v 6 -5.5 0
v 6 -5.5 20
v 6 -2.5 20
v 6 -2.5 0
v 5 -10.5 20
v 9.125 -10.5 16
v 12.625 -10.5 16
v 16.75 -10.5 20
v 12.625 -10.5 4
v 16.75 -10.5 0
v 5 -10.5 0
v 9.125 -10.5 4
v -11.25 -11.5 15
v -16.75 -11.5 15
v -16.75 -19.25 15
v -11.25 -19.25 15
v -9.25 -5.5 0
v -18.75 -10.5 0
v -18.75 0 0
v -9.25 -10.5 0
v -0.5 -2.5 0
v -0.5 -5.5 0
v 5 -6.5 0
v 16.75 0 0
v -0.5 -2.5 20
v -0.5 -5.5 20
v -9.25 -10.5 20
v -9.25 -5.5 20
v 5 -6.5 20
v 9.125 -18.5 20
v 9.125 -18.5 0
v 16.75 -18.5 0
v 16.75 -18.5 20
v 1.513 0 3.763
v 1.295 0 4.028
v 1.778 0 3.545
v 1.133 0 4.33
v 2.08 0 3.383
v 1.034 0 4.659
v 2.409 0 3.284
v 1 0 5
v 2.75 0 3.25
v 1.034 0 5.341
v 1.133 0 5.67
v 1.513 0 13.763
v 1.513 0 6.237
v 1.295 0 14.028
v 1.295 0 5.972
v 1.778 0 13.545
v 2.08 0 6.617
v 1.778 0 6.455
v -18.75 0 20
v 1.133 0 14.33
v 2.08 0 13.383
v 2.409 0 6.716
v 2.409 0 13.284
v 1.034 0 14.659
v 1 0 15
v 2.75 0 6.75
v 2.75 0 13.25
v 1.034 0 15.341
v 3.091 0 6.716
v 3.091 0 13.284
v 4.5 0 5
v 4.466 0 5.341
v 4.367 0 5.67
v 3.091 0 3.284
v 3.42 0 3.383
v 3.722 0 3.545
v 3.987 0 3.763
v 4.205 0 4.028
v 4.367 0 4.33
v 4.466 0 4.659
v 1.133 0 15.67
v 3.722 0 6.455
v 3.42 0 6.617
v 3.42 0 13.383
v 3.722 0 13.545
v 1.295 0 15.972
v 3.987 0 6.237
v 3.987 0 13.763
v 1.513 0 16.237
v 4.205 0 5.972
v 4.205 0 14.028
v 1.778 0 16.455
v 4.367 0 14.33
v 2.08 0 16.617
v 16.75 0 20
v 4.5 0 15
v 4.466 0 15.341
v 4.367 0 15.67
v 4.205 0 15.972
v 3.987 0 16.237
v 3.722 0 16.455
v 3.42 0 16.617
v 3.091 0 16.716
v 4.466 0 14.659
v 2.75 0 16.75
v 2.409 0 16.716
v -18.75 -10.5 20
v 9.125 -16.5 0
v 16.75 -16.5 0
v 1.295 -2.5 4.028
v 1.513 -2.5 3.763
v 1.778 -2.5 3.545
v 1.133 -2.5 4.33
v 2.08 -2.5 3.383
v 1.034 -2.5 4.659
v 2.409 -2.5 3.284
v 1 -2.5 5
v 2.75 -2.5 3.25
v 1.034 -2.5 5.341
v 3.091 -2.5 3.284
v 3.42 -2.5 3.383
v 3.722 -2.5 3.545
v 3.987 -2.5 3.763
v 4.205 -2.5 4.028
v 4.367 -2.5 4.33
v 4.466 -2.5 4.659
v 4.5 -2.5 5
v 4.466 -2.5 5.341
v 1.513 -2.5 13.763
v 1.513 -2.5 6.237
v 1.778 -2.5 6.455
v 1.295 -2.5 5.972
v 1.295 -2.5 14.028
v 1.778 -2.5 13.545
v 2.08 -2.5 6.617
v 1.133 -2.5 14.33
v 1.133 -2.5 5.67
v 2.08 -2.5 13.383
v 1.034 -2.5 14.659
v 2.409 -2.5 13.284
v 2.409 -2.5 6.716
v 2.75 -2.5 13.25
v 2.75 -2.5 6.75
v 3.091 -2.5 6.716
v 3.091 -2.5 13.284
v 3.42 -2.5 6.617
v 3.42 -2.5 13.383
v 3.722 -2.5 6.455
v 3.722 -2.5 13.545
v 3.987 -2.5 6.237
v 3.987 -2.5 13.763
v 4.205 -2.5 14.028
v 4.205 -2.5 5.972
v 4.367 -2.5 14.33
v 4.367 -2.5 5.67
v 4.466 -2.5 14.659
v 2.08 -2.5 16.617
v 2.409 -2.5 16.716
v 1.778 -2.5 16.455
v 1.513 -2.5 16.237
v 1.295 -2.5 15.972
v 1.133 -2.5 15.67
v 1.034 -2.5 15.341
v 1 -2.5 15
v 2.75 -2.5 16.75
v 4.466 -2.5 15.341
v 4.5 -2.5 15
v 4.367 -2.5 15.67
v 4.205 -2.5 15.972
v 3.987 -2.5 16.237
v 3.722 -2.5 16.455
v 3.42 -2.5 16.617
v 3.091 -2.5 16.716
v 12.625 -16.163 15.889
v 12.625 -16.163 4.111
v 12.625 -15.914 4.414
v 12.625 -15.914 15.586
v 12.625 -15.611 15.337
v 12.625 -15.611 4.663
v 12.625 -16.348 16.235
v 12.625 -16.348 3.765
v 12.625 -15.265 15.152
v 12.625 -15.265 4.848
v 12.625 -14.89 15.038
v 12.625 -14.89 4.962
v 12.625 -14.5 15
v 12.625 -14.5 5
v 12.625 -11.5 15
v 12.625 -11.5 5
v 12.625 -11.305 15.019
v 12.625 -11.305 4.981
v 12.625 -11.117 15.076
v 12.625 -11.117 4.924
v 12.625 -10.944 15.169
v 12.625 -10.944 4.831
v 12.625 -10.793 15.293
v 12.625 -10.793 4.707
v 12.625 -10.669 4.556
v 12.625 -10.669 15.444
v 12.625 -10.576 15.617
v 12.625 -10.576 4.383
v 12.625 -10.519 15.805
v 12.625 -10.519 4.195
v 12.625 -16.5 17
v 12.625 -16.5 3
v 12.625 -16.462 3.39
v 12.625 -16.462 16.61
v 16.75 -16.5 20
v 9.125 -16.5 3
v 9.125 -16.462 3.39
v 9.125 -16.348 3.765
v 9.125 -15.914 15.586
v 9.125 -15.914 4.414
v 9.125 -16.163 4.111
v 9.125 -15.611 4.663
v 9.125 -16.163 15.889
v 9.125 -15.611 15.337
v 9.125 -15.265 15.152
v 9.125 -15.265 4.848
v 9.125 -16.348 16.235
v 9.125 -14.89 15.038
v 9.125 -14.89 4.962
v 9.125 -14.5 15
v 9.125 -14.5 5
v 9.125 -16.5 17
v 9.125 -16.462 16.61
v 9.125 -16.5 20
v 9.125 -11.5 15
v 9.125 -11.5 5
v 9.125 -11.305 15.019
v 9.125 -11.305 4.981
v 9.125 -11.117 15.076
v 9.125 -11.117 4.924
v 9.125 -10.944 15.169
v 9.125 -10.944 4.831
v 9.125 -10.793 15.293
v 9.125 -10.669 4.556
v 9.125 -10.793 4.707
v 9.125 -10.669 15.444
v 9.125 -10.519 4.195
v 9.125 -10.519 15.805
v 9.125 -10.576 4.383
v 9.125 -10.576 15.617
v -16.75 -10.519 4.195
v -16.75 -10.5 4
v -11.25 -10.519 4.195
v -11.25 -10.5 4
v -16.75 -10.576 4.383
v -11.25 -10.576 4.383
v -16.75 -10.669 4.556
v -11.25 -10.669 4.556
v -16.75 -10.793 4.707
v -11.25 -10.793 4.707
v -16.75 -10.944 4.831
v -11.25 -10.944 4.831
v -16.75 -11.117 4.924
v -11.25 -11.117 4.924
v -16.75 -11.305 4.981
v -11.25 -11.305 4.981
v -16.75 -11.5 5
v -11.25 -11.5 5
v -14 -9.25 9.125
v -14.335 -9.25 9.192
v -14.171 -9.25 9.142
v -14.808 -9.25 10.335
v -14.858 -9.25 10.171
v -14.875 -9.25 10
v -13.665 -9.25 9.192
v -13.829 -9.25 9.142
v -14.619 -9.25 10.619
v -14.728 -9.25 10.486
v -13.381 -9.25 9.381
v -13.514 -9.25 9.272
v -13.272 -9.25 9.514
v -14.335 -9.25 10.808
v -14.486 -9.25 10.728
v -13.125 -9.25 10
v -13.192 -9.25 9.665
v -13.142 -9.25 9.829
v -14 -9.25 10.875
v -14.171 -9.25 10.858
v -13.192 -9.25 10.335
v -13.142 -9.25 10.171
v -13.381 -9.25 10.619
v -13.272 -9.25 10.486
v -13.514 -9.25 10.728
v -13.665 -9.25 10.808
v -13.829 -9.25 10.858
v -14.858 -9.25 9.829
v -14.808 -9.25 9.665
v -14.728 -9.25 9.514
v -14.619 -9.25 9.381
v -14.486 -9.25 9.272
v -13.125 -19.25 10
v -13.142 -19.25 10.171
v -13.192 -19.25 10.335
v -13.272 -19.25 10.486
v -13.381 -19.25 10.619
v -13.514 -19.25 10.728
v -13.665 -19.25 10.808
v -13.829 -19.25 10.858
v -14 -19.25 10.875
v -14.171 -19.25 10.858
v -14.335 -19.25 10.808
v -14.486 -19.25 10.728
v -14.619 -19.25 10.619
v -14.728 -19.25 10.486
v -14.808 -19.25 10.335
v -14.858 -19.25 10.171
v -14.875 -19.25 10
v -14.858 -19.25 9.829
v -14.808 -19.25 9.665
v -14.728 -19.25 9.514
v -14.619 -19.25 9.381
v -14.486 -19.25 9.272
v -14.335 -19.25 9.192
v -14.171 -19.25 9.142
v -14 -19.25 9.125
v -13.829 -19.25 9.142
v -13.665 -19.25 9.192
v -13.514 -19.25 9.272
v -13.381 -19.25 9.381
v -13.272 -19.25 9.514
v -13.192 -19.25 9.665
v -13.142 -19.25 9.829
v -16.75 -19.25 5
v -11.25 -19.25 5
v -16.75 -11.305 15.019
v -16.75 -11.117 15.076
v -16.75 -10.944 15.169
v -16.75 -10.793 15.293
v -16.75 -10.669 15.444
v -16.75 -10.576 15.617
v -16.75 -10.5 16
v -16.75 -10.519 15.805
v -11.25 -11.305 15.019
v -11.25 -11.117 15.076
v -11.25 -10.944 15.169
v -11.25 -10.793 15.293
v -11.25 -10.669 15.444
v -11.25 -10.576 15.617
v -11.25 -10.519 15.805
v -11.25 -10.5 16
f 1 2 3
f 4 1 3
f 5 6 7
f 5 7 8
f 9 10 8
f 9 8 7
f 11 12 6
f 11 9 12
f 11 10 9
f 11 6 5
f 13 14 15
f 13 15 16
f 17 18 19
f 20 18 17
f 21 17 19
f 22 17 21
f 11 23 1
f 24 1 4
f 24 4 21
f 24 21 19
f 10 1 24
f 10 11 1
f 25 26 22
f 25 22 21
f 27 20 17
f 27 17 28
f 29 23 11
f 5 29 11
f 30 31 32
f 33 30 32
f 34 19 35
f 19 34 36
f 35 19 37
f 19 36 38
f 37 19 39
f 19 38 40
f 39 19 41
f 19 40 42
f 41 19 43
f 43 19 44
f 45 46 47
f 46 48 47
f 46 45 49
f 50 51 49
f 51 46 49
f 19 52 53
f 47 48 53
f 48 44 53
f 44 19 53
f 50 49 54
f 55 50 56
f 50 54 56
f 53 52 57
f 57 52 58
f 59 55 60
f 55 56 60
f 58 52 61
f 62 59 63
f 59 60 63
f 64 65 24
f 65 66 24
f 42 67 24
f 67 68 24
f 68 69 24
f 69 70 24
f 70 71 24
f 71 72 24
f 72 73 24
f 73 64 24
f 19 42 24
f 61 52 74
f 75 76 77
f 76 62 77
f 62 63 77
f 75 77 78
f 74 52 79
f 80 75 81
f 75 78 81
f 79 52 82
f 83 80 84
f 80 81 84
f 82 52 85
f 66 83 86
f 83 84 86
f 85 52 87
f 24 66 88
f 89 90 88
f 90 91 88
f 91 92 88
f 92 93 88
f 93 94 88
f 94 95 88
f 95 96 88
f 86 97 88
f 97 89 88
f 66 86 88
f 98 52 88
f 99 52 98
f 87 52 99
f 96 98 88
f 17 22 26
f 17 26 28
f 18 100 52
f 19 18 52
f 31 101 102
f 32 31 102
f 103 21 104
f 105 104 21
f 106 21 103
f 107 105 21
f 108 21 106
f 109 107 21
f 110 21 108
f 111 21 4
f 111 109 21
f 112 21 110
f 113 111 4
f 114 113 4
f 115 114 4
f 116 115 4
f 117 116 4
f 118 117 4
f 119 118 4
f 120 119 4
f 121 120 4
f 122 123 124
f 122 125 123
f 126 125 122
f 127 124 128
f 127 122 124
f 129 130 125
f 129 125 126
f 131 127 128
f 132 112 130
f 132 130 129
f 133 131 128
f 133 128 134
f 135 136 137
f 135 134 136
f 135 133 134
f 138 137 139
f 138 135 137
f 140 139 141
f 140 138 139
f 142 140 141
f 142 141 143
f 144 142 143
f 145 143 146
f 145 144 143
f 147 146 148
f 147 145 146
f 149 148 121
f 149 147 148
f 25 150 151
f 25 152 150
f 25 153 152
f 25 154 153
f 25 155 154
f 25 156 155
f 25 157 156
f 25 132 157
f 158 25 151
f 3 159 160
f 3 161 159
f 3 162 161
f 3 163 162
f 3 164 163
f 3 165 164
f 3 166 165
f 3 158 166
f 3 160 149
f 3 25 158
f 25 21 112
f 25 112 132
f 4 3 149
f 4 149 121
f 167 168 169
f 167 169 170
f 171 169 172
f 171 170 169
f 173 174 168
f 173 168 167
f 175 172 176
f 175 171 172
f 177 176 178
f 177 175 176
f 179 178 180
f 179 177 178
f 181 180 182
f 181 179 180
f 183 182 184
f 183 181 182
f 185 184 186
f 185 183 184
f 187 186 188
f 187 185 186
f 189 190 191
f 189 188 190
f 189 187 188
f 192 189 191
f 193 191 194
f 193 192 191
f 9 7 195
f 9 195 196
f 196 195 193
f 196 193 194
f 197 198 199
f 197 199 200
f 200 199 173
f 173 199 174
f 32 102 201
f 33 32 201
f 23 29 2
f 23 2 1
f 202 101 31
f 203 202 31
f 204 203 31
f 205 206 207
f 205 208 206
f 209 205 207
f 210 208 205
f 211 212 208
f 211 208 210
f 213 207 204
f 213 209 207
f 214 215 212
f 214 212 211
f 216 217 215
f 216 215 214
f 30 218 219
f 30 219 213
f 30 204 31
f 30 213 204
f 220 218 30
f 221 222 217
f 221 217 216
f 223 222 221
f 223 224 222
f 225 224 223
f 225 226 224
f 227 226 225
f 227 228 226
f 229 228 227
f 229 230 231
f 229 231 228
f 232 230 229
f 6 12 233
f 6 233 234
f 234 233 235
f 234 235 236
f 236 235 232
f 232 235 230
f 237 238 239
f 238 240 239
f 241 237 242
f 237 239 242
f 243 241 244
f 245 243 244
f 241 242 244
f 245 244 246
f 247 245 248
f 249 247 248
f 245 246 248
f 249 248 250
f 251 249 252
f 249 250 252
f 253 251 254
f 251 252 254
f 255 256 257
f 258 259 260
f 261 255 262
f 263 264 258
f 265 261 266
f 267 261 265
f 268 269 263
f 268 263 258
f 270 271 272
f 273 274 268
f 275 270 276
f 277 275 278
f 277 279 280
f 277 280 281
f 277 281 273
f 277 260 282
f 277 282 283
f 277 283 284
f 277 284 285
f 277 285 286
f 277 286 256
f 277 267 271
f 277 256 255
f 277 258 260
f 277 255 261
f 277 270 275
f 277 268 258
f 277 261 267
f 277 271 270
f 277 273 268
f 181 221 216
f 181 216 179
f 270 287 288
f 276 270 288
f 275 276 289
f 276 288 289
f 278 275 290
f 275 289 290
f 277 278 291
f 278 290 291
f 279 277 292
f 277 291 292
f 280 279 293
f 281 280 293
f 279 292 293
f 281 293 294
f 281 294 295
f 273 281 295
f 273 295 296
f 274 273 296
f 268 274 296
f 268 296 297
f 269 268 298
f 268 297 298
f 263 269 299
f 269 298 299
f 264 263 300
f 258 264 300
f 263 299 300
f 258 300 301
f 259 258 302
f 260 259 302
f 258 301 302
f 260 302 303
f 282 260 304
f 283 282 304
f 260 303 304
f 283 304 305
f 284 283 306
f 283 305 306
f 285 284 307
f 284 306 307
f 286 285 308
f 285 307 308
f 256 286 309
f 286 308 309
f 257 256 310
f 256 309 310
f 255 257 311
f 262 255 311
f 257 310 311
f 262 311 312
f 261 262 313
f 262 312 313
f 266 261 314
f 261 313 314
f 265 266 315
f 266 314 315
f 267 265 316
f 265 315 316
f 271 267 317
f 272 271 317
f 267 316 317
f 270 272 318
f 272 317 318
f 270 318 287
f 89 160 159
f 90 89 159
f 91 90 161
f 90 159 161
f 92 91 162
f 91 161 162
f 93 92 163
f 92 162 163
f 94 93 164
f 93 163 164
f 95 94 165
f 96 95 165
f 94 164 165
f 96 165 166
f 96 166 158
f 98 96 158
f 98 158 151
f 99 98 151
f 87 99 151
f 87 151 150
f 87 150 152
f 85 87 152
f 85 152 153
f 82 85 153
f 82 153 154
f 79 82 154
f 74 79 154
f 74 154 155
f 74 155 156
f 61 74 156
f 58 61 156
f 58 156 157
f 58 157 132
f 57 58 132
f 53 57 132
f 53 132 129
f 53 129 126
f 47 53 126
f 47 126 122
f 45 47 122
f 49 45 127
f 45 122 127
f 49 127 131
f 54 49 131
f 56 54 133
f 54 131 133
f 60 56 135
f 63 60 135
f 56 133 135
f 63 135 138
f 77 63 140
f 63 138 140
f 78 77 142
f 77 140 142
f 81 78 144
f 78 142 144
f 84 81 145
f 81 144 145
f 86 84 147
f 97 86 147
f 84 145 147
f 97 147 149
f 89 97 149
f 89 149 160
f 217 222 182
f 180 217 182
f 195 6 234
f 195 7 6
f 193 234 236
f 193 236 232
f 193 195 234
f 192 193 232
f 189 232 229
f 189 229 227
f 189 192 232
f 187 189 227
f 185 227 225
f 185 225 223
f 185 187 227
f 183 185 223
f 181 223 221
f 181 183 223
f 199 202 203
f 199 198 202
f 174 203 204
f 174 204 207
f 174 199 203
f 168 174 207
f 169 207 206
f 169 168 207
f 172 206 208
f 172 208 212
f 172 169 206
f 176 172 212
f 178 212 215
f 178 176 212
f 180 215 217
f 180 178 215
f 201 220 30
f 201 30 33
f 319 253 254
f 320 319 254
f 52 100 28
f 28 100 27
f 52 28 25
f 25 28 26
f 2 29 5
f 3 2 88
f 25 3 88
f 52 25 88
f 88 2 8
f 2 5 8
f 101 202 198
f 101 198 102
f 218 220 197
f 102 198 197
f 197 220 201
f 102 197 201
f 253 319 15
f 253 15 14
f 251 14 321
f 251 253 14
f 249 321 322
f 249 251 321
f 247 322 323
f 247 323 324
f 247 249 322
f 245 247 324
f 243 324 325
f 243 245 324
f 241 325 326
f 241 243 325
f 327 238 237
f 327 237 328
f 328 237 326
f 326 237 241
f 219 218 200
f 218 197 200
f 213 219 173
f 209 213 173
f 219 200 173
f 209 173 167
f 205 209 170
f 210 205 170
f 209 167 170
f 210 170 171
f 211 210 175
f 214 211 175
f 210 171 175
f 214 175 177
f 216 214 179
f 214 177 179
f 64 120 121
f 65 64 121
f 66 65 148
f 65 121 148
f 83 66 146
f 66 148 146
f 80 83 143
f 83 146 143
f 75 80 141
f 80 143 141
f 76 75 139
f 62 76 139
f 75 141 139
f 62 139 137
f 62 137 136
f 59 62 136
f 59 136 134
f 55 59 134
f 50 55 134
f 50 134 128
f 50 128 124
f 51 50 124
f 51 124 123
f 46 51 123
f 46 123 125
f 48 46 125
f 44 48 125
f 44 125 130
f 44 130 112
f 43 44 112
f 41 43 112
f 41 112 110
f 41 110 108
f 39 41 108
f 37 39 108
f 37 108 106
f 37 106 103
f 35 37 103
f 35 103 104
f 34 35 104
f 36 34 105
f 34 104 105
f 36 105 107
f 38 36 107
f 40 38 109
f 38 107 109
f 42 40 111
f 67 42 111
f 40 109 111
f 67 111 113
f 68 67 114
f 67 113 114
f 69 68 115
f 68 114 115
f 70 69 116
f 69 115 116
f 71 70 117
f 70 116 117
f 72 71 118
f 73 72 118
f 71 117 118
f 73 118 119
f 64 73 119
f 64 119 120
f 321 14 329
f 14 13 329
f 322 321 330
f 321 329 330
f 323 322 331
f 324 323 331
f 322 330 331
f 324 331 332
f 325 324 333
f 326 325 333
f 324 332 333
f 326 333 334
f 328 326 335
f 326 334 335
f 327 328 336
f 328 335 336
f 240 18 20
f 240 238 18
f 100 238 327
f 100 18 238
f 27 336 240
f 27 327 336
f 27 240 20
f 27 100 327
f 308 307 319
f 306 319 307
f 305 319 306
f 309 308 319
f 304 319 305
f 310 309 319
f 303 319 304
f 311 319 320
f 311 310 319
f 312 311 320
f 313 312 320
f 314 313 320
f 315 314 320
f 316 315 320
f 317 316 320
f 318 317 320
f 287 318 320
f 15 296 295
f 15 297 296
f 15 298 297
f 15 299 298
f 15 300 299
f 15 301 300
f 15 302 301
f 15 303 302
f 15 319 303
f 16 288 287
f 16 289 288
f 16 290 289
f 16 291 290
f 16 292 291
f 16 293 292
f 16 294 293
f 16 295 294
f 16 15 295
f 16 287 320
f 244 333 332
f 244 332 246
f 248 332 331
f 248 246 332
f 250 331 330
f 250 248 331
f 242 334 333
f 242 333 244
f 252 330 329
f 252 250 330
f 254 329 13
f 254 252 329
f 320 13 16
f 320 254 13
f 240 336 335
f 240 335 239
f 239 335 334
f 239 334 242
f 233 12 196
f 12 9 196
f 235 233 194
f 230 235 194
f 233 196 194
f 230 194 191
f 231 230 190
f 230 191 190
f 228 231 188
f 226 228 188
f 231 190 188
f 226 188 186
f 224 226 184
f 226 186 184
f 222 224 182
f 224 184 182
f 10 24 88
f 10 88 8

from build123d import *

# Parameters (mm, degrees)
BOSS_EXTRUDE1_DEPTH = 20
SKETCH2_R           = 1.75
CUT_EXTRUDE1_DEPTH  = 3.5
SKETCH4_W           = 5.5
SKETCH4_H           = 10
BOSS_EXTRUDE2_DEPTH = 8.75
SKETCH5_R           = 0.875
CUT_EXTRUDE2_DEPTH  = 10
SKETCH6_W           = 3.5
SKETCH6_H           = 6
BOSS_EXTRUDE3_DEPTH = 5
FILLET1_R           = 1
SKETCH8_W           = 6.5
SKETCH8_H           = 3
CUT_EXTRUDE3_DEPTH  = 30
CHAMFER1_SIZE       = 1
SKETCH10_W          = 2
SKETCH10_H          = 10.5
BOSS_EXTRUDE5_DEPTH = 20
SKETCH11_W          = 2
SKETCH11_H          = 20
BOSS_EXTRUDE6_DEPTH = 5
SKETCH12_W          = 7.625
SKETCH12_H          = 20
BOSS_EXTRUDE7_DEPTH = 2
FILLET2_R           = 2


with BuildPart() as part:
    # Sketch1 → Boss-Extrude1 (new body)
    with BuildSketch(Plane.XY):
        Polygon((-16.75, 0), (16.75, 0), (16.75, -10.5), (5, -10.5), (5, -5.5), (5, -3.5), (0.5, -3.5), (0.5, -5.5), (-11.25, -5.5), (-11.25, -10.5), (-16.75, -10.5), align=None)
    extrude(amount=BOSS_EXTRUDE1_DEPTH)

    # Sketch2 → Cut-Extrude1 (cut)
    with BuildSketch(Plane.XZ.offset(3.5)):
        with Locations((2.75, 15)):
            Circle(SKETCH2_R)
        with Locations((2.75, 5)):
            Circle(SKETCH2_R)
    extrude(amount=-CUT_EXTRUDE1_DEPTH, mode=Mode.SUBTRACT)

    # Sketch4 → Boss-Extrude2 (add)
    with BuildSketch(Plane.XZ.offset(10.5)):
        with Locations((-14, 10)):
            Rectangle(SKETCH4_W, SKETCH4_H)
    extrude(amount=BOSS_EXTRUDE2_DEPTH)

    # Sketch5 → Cut-Extrude2 (cut)
    with BuildSketch(Plane.XZ.offset(19.25)):
        with Locations((-14, 10)):
            Circle(SKETCH5_R)
    extrude(amount=-CUT_EXTRUDE2_DEPTH, mode=Mode.SUBTRACT)

    # Sketch6 → Boss-Extrude3 (add, symmetric)
    with BuildSketch(Plane.XY.offset(10)):
        with Locations((10.875, -13.5)):
            Rectangle(SKETCH6_W, SKETCH6_H)
    extrude(amount=BOSS_EXTRUDE3_DEPTH, both=True)

    # Fillet1
    fillet1_edges = [part.edges().sort_by_distance(p)[0] for p in [
        (-14, -10.5, 5),
        (-14, -10.5, 15),
        (10.875, -10.5, 5),
        (10.875, -10.5, 15),
    ]]
    fillet(fillet1_edges, radius=FILLET1_R)

    # Sketch8 → Cut-Extrude3 (cut)
    with BuildSketch(Plane.XY.offset(20)):
        with Locations((2.75, -4)):
            Rectangle(SKETCH8_W, SKETCH8_H)
    extrude(amount=-CUT_EXTRUDE3_DEPTH, mode=Mode.SUBTRACT)

    # Chamfer1
    chamfer1_edges = [part.edges().sort_by_distance(p)[0] for p in [
        (5, -5.5, 10),
    ]]
    chamfer(chamfer1_edges, length=CHAMFER1_SIZE - 0.0001)  # a hair under: the kernel refuses the full size

    # Sketch10 → Boss-Extrude5 (add)
    with BuildSketch(Plane.XY.offset(20)):
        with Locations((-17.75, -5.25)):
            Rectangle(SKETCH10_W, SKETCH10_H)
    extrude(amount=-BOSS_EXTRUDE5_DEPTH)

    # Sketch11 → Boss-Extrude6 (add)
    with BuildSketch(Plane.XZ.offset(10.5)):
        with Locations((-10.25, 10)):
            Rectangle(SKETCH11_W, SKETCH11_H)
    extrude(amount=-BOSS_EXTRUDE6_DEPTH)

    # Sketch12 → Boss-Extrude7 (add)
    with BuildSketch(Plane.XZ.offset(16.5)):
        with Locations((12.9375, 10)):
            Rectangle(SKETCH12_W, SKETCH12_H)
    extrude(amount=BOSS_EXTRUDE7_DEPTH)

    # Fillet2
    fillet2_edges = [part.edges().sort_by_distance(p)[0] for p in [
        (10.875, -16.5, 5),
        (10.875, -16.5, 15),
    ]]
    fillet(fillet2_edges, radius=FILLET2_R)


solid = part.part
